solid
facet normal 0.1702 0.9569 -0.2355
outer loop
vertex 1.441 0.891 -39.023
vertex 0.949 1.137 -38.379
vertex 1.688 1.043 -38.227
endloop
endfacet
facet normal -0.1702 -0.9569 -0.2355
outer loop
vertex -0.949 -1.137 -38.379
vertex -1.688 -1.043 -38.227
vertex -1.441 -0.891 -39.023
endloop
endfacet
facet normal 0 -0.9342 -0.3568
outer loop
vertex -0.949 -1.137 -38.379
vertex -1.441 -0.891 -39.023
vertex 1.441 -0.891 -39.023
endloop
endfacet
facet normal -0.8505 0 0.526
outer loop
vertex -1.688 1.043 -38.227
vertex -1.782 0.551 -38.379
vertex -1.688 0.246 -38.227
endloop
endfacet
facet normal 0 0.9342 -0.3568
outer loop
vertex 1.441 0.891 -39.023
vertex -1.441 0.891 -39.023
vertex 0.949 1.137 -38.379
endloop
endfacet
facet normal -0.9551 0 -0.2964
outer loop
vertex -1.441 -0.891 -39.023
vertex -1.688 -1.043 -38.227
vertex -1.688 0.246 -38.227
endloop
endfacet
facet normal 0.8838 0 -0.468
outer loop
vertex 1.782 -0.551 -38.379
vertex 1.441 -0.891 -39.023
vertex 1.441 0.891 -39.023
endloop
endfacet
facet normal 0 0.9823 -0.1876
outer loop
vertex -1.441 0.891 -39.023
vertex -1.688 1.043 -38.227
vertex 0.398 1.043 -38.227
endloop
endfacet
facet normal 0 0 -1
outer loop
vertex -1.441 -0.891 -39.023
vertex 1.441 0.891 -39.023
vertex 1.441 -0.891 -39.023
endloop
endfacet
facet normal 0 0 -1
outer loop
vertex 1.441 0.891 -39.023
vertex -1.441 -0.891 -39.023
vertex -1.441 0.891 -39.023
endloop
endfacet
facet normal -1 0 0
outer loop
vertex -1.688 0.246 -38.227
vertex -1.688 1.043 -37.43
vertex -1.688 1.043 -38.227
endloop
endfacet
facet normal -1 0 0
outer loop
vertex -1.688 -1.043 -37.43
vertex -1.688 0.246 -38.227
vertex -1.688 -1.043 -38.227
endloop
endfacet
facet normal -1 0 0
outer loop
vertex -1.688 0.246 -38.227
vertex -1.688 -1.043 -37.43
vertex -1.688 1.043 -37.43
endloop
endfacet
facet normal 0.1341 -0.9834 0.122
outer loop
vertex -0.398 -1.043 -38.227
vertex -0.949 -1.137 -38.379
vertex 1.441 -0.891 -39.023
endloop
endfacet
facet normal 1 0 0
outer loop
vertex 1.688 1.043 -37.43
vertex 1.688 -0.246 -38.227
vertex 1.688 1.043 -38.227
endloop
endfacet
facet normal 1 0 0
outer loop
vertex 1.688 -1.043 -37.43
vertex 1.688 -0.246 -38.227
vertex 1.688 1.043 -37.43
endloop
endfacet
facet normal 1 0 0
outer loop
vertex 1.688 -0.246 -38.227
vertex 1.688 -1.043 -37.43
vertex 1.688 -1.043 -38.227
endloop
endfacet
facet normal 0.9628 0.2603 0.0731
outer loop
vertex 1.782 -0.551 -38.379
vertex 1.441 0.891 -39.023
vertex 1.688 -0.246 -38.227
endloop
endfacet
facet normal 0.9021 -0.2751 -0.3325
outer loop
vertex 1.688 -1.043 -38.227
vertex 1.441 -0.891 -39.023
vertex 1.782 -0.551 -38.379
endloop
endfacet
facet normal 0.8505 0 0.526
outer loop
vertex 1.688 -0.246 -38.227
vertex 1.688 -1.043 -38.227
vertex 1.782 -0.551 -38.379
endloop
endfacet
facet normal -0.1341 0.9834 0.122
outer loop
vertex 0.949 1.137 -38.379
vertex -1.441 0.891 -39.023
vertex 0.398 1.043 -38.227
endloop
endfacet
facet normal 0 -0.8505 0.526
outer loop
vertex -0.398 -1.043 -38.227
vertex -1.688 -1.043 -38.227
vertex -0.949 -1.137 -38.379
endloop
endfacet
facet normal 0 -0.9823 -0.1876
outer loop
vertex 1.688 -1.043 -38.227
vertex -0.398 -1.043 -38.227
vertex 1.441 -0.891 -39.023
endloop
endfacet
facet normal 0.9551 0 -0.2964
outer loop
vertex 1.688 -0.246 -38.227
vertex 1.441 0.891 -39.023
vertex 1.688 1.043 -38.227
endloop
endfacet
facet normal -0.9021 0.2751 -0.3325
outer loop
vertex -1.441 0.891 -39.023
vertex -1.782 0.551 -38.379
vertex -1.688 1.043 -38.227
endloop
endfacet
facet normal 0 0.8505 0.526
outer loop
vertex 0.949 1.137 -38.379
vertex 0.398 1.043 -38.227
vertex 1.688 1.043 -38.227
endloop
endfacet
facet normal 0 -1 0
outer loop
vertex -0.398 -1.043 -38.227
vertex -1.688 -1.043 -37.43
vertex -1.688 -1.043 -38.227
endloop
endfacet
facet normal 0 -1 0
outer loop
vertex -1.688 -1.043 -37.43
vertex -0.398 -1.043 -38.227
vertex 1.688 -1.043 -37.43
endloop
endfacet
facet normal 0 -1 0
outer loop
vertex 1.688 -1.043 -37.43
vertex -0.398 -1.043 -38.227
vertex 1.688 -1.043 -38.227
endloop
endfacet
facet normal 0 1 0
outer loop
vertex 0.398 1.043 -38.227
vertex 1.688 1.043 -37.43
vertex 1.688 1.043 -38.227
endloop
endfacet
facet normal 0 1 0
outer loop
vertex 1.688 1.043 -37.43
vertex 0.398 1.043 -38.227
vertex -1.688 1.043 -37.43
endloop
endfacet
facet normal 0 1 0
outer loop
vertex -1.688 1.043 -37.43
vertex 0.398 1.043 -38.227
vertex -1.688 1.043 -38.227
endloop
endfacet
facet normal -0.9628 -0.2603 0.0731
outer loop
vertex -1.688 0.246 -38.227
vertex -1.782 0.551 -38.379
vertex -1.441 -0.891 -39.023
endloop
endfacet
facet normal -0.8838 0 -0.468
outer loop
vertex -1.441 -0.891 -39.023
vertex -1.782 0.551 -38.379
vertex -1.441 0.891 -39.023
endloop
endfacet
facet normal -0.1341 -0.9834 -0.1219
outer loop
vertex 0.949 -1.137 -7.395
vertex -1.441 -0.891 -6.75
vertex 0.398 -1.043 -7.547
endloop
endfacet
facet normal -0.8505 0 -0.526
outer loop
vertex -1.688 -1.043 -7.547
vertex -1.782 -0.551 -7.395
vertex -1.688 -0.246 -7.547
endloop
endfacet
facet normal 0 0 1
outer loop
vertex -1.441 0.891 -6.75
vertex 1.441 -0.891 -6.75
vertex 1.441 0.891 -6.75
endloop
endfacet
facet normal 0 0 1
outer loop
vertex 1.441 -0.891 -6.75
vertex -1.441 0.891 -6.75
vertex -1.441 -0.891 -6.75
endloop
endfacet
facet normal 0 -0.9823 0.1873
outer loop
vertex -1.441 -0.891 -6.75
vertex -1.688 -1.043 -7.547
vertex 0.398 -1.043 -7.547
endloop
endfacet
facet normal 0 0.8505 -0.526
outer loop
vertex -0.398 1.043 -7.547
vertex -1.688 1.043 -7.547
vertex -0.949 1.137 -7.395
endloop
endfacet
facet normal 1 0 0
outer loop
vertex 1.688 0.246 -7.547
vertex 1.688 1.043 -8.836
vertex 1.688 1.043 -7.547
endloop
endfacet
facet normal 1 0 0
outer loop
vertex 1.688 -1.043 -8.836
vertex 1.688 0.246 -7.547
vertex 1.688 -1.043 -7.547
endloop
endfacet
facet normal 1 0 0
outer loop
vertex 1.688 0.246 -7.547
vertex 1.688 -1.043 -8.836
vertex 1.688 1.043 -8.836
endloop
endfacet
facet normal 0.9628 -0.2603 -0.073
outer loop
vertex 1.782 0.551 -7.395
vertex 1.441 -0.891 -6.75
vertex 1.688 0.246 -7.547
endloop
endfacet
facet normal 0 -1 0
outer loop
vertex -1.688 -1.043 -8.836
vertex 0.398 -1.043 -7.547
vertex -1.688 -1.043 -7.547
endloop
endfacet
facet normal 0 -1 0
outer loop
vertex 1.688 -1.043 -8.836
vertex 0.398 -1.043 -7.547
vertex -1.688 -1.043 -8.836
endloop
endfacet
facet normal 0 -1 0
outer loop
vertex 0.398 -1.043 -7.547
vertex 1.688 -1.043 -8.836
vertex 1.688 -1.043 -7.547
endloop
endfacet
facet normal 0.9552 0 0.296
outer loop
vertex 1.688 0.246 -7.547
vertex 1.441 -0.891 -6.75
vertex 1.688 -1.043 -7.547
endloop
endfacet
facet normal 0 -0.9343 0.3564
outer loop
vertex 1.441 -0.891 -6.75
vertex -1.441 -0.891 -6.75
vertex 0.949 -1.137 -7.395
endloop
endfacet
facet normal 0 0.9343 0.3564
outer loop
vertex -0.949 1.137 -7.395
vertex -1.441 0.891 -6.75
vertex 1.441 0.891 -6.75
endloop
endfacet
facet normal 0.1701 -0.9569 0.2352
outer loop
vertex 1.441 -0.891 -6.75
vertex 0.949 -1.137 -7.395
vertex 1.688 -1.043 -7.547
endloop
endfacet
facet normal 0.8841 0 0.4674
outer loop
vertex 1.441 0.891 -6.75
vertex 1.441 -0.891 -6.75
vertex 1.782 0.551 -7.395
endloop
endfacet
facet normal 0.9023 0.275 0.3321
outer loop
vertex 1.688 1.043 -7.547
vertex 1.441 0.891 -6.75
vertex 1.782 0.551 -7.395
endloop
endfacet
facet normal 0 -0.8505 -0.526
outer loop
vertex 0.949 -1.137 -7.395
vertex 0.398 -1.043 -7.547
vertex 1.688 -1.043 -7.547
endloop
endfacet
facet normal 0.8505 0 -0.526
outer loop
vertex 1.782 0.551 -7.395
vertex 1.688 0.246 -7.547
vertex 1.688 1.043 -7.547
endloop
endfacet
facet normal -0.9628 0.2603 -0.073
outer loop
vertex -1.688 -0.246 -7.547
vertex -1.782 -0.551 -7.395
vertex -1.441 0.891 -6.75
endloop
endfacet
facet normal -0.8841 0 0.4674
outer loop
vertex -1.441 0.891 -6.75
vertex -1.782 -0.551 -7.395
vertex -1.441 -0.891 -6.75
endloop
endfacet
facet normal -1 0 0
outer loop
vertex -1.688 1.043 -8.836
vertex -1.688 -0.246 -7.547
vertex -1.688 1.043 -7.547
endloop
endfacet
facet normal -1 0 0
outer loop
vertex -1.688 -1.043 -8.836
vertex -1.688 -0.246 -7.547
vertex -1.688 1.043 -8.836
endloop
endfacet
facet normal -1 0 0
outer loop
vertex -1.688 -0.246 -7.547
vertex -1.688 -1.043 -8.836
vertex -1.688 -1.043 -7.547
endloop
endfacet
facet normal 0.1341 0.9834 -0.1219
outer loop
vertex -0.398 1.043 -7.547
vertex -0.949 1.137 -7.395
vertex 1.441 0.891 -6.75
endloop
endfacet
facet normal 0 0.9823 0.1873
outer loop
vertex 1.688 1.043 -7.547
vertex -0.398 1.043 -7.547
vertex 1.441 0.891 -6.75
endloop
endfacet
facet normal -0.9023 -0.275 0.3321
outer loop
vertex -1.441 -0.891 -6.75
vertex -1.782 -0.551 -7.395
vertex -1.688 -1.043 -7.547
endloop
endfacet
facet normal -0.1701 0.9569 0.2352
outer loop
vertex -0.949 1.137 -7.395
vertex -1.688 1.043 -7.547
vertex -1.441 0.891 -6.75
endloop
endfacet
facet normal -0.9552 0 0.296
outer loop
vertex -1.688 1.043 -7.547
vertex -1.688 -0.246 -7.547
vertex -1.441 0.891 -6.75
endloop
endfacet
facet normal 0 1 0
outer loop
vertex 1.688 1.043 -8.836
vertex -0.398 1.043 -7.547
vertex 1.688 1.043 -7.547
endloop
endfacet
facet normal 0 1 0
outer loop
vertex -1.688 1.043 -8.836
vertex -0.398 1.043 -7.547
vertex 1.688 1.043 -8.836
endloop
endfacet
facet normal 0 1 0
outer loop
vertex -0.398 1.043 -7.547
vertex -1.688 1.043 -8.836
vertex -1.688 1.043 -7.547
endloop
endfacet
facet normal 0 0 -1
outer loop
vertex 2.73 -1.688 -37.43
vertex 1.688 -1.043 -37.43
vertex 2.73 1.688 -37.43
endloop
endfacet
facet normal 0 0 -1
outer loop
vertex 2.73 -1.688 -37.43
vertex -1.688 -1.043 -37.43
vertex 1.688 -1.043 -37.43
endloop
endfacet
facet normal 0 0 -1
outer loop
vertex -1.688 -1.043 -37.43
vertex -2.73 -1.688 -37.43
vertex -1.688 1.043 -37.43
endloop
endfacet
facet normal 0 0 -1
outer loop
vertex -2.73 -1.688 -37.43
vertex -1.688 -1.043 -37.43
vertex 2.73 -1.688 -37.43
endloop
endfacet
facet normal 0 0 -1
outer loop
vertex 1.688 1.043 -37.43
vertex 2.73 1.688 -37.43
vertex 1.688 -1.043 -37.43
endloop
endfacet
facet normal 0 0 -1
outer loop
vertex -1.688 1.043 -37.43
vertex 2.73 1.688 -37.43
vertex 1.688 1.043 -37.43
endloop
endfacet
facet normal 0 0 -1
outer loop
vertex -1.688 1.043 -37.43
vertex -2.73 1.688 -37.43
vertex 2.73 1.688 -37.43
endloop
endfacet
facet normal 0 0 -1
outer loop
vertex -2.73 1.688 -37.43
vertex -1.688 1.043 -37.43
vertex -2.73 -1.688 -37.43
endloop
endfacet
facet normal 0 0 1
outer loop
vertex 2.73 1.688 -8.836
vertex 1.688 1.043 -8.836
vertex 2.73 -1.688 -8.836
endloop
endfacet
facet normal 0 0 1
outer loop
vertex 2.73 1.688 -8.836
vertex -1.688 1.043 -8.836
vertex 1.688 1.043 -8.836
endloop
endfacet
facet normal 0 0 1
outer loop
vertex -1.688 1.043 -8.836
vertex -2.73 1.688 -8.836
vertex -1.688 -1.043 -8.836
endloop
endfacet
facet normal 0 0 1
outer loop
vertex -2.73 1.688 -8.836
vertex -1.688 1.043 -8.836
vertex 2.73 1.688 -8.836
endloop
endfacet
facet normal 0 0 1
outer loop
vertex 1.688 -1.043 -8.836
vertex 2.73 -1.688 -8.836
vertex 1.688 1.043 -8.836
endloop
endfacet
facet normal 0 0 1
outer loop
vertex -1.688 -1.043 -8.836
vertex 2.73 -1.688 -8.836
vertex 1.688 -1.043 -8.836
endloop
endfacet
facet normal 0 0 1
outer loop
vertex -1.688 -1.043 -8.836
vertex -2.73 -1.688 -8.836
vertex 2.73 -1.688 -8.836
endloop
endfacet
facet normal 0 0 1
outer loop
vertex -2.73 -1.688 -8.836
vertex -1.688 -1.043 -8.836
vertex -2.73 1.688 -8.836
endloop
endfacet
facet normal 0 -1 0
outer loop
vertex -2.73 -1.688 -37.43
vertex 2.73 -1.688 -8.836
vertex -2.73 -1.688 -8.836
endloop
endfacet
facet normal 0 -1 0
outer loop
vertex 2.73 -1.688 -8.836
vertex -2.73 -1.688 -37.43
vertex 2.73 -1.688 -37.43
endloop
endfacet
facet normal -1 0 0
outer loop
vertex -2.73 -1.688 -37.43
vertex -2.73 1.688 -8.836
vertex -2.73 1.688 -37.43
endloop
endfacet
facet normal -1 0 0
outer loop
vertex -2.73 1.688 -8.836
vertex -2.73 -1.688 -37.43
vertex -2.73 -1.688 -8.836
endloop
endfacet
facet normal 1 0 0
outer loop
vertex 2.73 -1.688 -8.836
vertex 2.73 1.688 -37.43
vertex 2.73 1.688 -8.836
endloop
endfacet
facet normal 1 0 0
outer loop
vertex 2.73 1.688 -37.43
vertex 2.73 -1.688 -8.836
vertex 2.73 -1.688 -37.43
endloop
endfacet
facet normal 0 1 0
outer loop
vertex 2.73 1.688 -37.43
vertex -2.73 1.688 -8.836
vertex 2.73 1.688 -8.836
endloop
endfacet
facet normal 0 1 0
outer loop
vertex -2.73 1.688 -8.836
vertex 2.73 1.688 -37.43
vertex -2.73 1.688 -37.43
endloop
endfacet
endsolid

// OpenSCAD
sc=(4+2*sqrt(5))/cos(16.5);
points=[[ -0.309017, -0.190983, -4.236068 ], [ -0.309017, -0.190983, -1.000000 ], [ -0.309017, 0.190983, -4.236068 ], [ -0.309017, 0.190983, -1.000000 ], [ -0.201626, -0.062306, -0.836881 ], [ -0.201626, 0.062306, -4.343459 ], [ -0.190983, -0.118034, -4.326238 ], [ -0.190983, -0.118034, -3.944272 ], [ -0.190983, -0.118034, -1.236068 ], [ -0.190983, -0.118034, -0.854102 ], [ -0.190983, -0.027864, -0.854102 ], [ -0.190983, 0.027864, -4.326238 ], [ -0.190983, 0.118034, -4.326238 ], [ -0.190983, 0.118034, -3.944272 ], [ -0.190983, 0.118034, -1.236068 ], [ -0.190983, 0.118034, -0.854102 ], [ -0.163119, -0.100813, -4.416408 ], [ -0.163119, -0.100813, -0.763932 ], [ -0.163119, 0.100813, -4.416408 ], [ -0.163119, 0.100813, -0.763932 ], [ -0.107391, -0.128677, -4.343459 ], [ -0.107391, 0.128677, -0.836881 ], [ -0.045085, -0.118034, -4.326238 ], [ -0.045085, 0.118034, -0.854102 ], [ 0.000000, 0.000000, -5.236068 ], [ 0.000000, 0.000000, 0.000000 ], [ 0.045085, -0.118034, -0.854102 ], [ 0.045085, 0.118034, -4.326238 ], [ 0.107391, -0.128677, -0.836881 ], [ 0.107391, 0.128677, -4.343459 ], [ 0.163119, -0.100813, -4.416408 ], [ 0.163119, -0.100813, -0.763932 ], [ 0.163119, 0.100813, -4.416408 ], [ 0.163119, 0.100813, -0.763932 ], [ 0.190983, -0.118034, -4.326238 ], [ 0.190983, -0.118034, -3.944272 ], [ 0.190983, -0.118034, -1.236068 ], [ 0.190983, -0.118034, -0.854102 ], [ 0.190983, -0.027864, -4.326238 ], [ 0.190983, 0.027864, -0.854102 ], [ 0.190983, 0.118034, -4.326238 ], [ 0.190983, 0.118034, -3.944272 ], [ 0.190983, 0.118034, -1.236068 ], [ 0.190983, 0.118034, -0.854102 ], [ 0.201626, -0.062306, -4.343459 ], [ 0.201626, 0.062306, -0.836881 ], [ 0.309017, -0.190983, -4.236068 ], [ 0.309017, -0.190983, -1.000000 ], [ 0.309017, 0.190983, -4.236068 ], [ 0.309017, 0.190983, -1.000000 ], [ 5.236068, 0.000000, -5.236068 ]];

scale(sc) render() {
color("#D91218") polyhedron(points,faces=[[ 29, 40, 32 ],[ 20, 6, 16 ],[ 20, 16, 30 ],[ 38, 41, 35 ],[ 11, 12, 5 ],[ 29, 32, 18 ],[ 16, 6, 11 ],[ 32, 44, 30 ],[ 27, 41, 40 ],[ 18, 12, 27 ],[ 38, 40, 41 ],[ 16, 18, 32, 30 ],[ 11, 6, 7 ],[ 27, 13, 41 ],[ 30, 22, 20 ],[ 34, 38, 35 ],[ 32, 38, 44 ],[ 34, 35, 22 ],[ 30, 44, 34 ],[ 38, 34, 44 ],[ 18, 27, 29 ],[ 22, 6, 20 ],[ 30, 34, 22 ],[ 32, 40, 38 ],[ 12, 11, 13 ],[ 11, 7, 13 ],[ 18, 5, 12 ],[ 22, 35, 7 ],[ 27, 40, 29 ],[ 7, 35, 41, 13 ],[ 22, 7, 6 ],[ 12, 13, 27 ],[ 16, 11, 5 ],[ 16, 5, 18 ]]);
color("#00993F") polyhedron(points,faces=[[ 17, 26, 28 ],[ 10, 9, 4 ],[ 31, 33, 19, 17 ],[ 10, 14, 8 ],[ 17, 9, 26 ],[ 23, 15, 21 ],[ 39, 36, 42 ],[ 31, 39, 45 ],[ 9, 8, 26 ],[ 31, 37, 39 ],[ 28, 31, 17 ],[ 43, 39, 42 ],[ 21, 19, 33 ],[ 28, 37, 31 ],[ 31, 45, 33 ],[ 33, 45, 43 ],[ 26, 37, 28 ],[ 26, 8, 36 ],[ 23, 42, 14 ],[ 26, 36, 37 ],[ 43, 42, 23 ],[ 36, 8, 14, 42 ],[ 39, 43, 45 ],[ 19, 10, 4 ],[ 39, 37, 36 ],[ 19, 4, 17 ],[ 10, 15, 14 ],[ 9, 10, 8 ],[ 33, 23, 21 ],[ 33, 43, 23 ],[ 17, 4, 9 ],[ 21, 15, 19 ],[ 19, 15, 10 ],[ 23, 14, 15 ]]);
color("#008EC2") polyhedron(points,faces=[[ 46, 0, 2, 48 ],[ 1, 47, 49, 3 ],[ 46, 47, 1, 0 ],[ 1, 3, 2, 0 ],[ 46, 48, 49, 47 ],[ 48, 2, 3, 49 ]]);
}
